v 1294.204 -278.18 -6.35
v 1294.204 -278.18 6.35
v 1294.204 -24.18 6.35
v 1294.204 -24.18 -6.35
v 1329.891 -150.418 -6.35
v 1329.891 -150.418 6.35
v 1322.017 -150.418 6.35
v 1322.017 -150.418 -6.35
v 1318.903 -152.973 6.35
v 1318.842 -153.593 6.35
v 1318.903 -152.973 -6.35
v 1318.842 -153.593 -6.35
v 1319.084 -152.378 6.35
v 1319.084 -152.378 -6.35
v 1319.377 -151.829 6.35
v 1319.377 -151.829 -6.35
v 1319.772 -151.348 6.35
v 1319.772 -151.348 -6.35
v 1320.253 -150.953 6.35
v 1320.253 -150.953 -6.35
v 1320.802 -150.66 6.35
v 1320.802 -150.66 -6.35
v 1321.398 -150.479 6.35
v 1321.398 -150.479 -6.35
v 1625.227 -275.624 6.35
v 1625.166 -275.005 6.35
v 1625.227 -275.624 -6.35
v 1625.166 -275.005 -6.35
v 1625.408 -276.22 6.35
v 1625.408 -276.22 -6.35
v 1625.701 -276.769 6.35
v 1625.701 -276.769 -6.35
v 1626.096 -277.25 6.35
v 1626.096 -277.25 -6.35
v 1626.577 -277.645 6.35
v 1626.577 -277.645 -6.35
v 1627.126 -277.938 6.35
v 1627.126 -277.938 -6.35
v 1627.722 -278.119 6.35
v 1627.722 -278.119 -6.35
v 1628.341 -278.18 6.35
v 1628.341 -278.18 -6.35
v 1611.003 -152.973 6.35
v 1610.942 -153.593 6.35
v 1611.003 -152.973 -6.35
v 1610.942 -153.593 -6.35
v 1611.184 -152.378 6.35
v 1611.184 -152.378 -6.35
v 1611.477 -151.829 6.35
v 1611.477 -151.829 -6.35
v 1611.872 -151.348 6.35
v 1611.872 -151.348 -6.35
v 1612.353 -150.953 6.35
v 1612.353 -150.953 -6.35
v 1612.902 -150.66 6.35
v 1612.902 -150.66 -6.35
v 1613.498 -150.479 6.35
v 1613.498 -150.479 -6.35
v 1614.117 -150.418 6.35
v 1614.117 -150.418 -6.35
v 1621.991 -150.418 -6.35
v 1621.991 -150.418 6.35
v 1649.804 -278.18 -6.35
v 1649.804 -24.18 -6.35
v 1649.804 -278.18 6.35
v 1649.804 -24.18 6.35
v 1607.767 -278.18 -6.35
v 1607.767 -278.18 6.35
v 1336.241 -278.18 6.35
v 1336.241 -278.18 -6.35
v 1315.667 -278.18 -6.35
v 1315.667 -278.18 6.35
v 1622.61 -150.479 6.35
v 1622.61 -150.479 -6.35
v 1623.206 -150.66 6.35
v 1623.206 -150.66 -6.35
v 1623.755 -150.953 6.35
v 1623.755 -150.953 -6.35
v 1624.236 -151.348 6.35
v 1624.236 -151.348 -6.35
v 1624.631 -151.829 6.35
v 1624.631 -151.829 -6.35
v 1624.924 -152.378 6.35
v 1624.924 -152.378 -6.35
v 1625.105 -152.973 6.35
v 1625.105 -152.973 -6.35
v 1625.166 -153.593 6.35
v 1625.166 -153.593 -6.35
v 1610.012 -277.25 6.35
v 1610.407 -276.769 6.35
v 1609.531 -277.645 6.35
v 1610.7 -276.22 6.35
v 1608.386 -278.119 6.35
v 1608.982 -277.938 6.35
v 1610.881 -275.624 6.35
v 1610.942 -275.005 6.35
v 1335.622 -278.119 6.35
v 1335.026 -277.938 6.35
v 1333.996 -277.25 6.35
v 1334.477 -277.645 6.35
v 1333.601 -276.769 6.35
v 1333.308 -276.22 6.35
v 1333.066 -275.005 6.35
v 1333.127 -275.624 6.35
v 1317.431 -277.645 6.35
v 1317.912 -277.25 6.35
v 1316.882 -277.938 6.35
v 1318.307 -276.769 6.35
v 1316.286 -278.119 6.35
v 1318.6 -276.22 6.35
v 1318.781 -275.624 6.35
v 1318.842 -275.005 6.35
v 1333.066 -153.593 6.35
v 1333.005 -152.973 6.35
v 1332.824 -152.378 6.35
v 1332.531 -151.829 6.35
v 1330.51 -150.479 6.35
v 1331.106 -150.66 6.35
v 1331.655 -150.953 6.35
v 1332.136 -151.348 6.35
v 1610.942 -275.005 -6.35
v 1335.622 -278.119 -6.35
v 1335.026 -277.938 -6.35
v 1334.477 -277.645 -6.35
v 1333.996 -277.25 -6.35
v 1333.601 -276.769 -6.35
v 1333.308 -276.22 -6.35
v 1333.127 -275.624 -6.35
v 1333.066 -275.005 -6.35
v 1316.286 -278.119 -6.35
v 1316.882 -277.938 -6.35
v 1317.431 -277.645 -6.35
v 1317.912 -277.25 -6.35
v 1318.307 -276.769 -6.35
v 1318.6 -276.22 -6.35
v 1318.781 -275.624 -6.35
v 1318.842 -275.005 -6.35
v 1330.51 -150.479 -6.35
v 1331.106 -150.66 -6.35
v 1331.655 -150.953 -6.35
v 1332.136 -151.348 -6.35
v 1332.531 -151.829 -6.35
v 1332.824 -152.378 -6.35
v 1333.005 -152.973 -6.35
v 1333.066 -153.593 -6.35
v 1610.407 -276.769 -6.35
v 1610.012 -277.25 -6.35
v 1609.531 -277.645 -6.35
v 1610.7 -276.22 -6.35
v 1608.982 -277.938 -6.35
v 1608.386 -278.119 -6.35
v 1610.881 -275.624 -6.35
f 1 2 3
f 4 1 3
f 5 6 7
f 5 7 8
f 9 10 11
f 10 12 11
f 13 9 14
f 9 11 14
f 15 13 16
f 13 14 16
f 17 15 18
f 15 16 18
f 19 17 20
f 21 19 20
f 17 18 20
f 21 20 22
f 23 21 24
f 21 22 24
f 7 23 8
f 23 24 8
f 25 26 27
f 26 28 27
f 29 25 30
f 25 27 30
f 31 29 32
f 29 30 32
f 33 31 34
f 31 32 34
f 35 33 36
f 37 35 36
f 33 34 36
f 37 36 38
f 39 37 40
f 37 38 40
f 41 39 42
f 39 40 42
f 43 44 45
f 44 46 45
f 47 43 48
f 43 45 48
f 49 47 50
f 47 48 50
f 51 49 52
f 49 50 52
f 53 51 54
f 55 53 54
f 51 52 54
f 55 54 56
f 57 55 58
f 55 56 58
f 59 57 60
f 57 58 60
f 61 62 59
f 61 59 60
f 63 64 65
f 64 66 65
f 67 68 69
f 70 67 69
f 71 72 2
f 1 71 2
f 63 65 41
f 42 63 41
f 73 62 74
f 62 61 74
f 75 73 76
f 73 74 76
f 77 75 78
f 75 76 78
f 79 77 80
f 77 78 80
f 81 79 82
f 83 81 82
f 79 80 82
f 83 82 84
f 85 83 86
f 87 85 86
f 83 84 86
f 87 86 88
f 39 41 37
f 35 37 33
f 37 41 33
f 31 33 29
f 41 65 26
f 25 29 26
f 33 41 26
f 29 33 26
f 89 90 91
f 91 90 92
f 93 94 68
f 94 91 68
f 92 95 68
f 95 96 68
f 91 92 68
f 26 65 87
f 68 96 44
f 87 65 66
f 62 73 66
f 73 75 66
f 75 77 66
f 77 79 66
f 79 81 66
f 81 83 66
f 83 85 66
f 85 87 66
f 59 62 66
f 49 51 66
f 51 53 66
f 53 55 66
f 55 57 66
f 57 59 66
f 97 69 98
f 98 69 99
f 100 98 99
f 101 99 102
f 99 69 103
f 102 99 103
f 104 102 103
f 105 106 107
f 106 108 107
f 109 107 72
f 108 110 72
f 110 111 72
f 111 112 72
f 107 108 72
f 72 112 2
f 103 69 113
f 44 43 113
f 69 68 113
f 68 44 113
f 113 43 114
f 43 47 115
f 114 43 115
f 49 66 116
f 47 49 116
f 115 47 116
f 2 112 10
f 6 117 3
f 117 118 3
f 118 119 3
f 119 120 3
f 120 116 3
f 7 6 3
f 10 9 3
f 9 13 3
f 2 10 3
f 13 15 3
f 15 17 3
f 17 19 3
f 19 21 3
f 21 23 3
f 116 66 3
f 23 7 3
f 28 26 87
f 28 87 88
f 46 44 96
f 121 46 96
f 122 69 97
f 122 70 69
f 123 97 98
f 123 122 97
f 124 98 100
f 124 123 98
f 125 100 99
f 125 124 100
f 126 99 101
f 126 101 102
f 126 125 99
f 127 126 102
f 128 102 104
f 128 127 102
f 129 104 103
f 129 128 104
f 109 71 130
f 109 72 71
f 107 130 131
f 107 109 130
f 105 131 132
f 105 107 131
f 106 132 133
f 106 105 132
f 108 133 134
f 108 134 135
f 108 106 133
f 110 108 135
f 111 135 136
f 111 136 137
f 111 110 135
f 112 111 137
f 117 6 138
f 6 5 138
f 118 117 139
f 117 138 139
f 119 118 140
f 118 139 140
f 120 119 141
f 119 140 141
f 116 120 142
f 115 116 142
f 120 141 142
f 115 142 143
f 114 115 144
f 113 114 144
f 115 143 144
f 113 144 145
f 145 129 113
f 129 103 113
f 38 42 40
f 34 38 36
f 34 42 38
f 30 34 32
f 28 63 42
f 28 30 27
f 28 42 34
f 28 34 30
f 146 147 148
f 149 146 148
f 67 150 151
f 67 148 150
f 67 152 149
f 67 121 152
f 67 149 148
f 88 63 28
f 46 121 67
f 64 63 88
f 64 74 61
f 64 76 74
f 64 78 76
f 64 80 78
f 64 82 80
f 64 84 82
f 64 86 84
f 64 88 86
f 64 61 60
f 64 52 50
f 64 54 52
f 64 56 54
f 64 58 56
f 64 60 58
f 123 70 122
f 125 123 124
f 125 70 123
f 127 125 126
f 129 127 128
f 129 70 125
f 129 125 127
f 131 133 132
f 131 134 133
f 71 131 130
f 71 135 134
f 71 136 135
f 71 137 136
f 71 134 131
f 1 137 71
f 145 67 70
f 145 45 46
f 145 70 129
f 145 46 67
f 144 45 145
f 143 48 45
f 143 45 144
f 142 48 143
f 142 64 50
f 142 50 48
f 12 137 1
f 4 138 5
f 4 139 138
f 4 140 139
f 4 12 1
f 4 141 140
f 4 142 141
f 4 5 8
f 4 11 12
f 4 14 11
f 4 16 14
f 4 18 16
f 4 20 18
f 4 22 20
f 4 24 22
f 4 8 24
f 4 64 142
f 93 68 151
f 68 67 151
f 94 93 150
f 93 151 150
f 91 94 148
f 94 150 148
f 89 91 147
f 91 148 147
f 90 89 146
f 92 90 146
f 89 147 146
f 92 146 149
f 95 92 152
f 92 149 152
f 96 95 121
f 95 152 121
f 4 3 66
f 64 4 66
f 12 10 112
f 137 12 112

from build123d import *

# Parameters (mm, degrees)
BOSS_EXTRUDE1_DEPTH = 6.35
MOVE_FACE_SLOT_BY   = 0.762
MOVE_FACE_SLOT_2_BY = 0.762
MOVE_FACE_SLOT_3_BY = 0.762
MOVE_FACE_SLOT_4_BY = 0.762
MOVE_FACE_SLOT_5_BY = 0.762
MOVE_FACE_SLOT_6_BY = 0.762
FILLET1_R           = 3.175


with BuildPart() as part:
    # Sketch1 → Boss-Extrude1 (new, symmetric)
    with BuildSketch(Plane.XY):
        Polygon((1294.203955658, -24.179867224), (1649.803955658, -24.179867224), (1649.803955658, -278.179867224), (1624.403955658, -278.179867224), (1624.403955658, -151.179867224), (1611.703955658, -151.179867224), (1611.703955658, -278.179867224), (1332.303955658, -278.179867224), (1332.303955658, -151.179867224), (1319.603955658, -151.179867224), (1319.603955658, -278.179867224), (1294.203955658, -278.179867224), align=None)
    extrude(amount=BOSS_EXTRUDE1_DEPTH, both=True)

    # Move Face slot: a face moved inward by 0.762
    extrude(part.faces().sort_by_distance((1611.703955658, -214.679867224, 0))[0], amount=MOVE_FACE_SLOT_BY, dir=(-1, 0, 0), mode=Mode.SUBTRACT)

    # Move Face slot 2: a face moved inward by 0.762
    extrude(part.faces().sort_by_distance((1624.403955658, -214.679867224, 0))[0], amount=MOVE_FACE_SLOT_2_BY, dir=(1, 0, 0), mode=Mode.SUBTRACT)

    # Move Face slot 3: a face moved inward by 0.762
    extrude(part.faces().sort_by_distance((1618.053955658, -151.179867224, 0))[0], amount=MOVE_FACE_SLOT_3_BY, dir=(0, 1, 0), mode=Mode.SUBTRACT)

    # Move Face slot 4: a face moved inward by 0.762
    extrude(part.faces().sort_by_distance((1332.303955658, -214.679867224, 0))[0], amount=MOVE_FACE_SLOT_4_BY, dir=(1, 0, 0), mode=Mode.SUBTRACT)

    # Move Face slot 5: a face moved inward by 0.762
    extrude(part.faces().sort_by_distance((1325.953955658, -151.179867224, 0))[0], amount=MOVE_FACE_SLOT_5_BY, dir=(0, 1, 0), mode=Mode.SUBTRACT)

    # Move Face slot 6: a face moved inward by 0.762
    extrude(part.faces().sort_by_distance((1319.603955658, -214.679867224, 0))[0], amount=MOVE_FACE_SLOT_6_BY, dir=(-1, 0, 0), mode=Mode.SUBTRACT)

    # Fillet1
    fillet1_edges = [part.edges().sort_by_distance(p)[0] for p in [
        (1625.165955658, -278.179867224, 0),
        (1625.165955658, -150.417867224, 0),
        (1610.941955658, -150.417867224, 0),
        (1610.941955658, -278.179867224, 0),
        (1333.065955658, -278.179867224, 0),
        (1333.065955658, -150.417867224, 0),
        (1318.841955658, -150.417867224, 0),
        (1318.841955658, -278.179867224, 0),
    ]]
    fillet(fillet1_edges, radius=FILLET1_R)


solid = part.part
